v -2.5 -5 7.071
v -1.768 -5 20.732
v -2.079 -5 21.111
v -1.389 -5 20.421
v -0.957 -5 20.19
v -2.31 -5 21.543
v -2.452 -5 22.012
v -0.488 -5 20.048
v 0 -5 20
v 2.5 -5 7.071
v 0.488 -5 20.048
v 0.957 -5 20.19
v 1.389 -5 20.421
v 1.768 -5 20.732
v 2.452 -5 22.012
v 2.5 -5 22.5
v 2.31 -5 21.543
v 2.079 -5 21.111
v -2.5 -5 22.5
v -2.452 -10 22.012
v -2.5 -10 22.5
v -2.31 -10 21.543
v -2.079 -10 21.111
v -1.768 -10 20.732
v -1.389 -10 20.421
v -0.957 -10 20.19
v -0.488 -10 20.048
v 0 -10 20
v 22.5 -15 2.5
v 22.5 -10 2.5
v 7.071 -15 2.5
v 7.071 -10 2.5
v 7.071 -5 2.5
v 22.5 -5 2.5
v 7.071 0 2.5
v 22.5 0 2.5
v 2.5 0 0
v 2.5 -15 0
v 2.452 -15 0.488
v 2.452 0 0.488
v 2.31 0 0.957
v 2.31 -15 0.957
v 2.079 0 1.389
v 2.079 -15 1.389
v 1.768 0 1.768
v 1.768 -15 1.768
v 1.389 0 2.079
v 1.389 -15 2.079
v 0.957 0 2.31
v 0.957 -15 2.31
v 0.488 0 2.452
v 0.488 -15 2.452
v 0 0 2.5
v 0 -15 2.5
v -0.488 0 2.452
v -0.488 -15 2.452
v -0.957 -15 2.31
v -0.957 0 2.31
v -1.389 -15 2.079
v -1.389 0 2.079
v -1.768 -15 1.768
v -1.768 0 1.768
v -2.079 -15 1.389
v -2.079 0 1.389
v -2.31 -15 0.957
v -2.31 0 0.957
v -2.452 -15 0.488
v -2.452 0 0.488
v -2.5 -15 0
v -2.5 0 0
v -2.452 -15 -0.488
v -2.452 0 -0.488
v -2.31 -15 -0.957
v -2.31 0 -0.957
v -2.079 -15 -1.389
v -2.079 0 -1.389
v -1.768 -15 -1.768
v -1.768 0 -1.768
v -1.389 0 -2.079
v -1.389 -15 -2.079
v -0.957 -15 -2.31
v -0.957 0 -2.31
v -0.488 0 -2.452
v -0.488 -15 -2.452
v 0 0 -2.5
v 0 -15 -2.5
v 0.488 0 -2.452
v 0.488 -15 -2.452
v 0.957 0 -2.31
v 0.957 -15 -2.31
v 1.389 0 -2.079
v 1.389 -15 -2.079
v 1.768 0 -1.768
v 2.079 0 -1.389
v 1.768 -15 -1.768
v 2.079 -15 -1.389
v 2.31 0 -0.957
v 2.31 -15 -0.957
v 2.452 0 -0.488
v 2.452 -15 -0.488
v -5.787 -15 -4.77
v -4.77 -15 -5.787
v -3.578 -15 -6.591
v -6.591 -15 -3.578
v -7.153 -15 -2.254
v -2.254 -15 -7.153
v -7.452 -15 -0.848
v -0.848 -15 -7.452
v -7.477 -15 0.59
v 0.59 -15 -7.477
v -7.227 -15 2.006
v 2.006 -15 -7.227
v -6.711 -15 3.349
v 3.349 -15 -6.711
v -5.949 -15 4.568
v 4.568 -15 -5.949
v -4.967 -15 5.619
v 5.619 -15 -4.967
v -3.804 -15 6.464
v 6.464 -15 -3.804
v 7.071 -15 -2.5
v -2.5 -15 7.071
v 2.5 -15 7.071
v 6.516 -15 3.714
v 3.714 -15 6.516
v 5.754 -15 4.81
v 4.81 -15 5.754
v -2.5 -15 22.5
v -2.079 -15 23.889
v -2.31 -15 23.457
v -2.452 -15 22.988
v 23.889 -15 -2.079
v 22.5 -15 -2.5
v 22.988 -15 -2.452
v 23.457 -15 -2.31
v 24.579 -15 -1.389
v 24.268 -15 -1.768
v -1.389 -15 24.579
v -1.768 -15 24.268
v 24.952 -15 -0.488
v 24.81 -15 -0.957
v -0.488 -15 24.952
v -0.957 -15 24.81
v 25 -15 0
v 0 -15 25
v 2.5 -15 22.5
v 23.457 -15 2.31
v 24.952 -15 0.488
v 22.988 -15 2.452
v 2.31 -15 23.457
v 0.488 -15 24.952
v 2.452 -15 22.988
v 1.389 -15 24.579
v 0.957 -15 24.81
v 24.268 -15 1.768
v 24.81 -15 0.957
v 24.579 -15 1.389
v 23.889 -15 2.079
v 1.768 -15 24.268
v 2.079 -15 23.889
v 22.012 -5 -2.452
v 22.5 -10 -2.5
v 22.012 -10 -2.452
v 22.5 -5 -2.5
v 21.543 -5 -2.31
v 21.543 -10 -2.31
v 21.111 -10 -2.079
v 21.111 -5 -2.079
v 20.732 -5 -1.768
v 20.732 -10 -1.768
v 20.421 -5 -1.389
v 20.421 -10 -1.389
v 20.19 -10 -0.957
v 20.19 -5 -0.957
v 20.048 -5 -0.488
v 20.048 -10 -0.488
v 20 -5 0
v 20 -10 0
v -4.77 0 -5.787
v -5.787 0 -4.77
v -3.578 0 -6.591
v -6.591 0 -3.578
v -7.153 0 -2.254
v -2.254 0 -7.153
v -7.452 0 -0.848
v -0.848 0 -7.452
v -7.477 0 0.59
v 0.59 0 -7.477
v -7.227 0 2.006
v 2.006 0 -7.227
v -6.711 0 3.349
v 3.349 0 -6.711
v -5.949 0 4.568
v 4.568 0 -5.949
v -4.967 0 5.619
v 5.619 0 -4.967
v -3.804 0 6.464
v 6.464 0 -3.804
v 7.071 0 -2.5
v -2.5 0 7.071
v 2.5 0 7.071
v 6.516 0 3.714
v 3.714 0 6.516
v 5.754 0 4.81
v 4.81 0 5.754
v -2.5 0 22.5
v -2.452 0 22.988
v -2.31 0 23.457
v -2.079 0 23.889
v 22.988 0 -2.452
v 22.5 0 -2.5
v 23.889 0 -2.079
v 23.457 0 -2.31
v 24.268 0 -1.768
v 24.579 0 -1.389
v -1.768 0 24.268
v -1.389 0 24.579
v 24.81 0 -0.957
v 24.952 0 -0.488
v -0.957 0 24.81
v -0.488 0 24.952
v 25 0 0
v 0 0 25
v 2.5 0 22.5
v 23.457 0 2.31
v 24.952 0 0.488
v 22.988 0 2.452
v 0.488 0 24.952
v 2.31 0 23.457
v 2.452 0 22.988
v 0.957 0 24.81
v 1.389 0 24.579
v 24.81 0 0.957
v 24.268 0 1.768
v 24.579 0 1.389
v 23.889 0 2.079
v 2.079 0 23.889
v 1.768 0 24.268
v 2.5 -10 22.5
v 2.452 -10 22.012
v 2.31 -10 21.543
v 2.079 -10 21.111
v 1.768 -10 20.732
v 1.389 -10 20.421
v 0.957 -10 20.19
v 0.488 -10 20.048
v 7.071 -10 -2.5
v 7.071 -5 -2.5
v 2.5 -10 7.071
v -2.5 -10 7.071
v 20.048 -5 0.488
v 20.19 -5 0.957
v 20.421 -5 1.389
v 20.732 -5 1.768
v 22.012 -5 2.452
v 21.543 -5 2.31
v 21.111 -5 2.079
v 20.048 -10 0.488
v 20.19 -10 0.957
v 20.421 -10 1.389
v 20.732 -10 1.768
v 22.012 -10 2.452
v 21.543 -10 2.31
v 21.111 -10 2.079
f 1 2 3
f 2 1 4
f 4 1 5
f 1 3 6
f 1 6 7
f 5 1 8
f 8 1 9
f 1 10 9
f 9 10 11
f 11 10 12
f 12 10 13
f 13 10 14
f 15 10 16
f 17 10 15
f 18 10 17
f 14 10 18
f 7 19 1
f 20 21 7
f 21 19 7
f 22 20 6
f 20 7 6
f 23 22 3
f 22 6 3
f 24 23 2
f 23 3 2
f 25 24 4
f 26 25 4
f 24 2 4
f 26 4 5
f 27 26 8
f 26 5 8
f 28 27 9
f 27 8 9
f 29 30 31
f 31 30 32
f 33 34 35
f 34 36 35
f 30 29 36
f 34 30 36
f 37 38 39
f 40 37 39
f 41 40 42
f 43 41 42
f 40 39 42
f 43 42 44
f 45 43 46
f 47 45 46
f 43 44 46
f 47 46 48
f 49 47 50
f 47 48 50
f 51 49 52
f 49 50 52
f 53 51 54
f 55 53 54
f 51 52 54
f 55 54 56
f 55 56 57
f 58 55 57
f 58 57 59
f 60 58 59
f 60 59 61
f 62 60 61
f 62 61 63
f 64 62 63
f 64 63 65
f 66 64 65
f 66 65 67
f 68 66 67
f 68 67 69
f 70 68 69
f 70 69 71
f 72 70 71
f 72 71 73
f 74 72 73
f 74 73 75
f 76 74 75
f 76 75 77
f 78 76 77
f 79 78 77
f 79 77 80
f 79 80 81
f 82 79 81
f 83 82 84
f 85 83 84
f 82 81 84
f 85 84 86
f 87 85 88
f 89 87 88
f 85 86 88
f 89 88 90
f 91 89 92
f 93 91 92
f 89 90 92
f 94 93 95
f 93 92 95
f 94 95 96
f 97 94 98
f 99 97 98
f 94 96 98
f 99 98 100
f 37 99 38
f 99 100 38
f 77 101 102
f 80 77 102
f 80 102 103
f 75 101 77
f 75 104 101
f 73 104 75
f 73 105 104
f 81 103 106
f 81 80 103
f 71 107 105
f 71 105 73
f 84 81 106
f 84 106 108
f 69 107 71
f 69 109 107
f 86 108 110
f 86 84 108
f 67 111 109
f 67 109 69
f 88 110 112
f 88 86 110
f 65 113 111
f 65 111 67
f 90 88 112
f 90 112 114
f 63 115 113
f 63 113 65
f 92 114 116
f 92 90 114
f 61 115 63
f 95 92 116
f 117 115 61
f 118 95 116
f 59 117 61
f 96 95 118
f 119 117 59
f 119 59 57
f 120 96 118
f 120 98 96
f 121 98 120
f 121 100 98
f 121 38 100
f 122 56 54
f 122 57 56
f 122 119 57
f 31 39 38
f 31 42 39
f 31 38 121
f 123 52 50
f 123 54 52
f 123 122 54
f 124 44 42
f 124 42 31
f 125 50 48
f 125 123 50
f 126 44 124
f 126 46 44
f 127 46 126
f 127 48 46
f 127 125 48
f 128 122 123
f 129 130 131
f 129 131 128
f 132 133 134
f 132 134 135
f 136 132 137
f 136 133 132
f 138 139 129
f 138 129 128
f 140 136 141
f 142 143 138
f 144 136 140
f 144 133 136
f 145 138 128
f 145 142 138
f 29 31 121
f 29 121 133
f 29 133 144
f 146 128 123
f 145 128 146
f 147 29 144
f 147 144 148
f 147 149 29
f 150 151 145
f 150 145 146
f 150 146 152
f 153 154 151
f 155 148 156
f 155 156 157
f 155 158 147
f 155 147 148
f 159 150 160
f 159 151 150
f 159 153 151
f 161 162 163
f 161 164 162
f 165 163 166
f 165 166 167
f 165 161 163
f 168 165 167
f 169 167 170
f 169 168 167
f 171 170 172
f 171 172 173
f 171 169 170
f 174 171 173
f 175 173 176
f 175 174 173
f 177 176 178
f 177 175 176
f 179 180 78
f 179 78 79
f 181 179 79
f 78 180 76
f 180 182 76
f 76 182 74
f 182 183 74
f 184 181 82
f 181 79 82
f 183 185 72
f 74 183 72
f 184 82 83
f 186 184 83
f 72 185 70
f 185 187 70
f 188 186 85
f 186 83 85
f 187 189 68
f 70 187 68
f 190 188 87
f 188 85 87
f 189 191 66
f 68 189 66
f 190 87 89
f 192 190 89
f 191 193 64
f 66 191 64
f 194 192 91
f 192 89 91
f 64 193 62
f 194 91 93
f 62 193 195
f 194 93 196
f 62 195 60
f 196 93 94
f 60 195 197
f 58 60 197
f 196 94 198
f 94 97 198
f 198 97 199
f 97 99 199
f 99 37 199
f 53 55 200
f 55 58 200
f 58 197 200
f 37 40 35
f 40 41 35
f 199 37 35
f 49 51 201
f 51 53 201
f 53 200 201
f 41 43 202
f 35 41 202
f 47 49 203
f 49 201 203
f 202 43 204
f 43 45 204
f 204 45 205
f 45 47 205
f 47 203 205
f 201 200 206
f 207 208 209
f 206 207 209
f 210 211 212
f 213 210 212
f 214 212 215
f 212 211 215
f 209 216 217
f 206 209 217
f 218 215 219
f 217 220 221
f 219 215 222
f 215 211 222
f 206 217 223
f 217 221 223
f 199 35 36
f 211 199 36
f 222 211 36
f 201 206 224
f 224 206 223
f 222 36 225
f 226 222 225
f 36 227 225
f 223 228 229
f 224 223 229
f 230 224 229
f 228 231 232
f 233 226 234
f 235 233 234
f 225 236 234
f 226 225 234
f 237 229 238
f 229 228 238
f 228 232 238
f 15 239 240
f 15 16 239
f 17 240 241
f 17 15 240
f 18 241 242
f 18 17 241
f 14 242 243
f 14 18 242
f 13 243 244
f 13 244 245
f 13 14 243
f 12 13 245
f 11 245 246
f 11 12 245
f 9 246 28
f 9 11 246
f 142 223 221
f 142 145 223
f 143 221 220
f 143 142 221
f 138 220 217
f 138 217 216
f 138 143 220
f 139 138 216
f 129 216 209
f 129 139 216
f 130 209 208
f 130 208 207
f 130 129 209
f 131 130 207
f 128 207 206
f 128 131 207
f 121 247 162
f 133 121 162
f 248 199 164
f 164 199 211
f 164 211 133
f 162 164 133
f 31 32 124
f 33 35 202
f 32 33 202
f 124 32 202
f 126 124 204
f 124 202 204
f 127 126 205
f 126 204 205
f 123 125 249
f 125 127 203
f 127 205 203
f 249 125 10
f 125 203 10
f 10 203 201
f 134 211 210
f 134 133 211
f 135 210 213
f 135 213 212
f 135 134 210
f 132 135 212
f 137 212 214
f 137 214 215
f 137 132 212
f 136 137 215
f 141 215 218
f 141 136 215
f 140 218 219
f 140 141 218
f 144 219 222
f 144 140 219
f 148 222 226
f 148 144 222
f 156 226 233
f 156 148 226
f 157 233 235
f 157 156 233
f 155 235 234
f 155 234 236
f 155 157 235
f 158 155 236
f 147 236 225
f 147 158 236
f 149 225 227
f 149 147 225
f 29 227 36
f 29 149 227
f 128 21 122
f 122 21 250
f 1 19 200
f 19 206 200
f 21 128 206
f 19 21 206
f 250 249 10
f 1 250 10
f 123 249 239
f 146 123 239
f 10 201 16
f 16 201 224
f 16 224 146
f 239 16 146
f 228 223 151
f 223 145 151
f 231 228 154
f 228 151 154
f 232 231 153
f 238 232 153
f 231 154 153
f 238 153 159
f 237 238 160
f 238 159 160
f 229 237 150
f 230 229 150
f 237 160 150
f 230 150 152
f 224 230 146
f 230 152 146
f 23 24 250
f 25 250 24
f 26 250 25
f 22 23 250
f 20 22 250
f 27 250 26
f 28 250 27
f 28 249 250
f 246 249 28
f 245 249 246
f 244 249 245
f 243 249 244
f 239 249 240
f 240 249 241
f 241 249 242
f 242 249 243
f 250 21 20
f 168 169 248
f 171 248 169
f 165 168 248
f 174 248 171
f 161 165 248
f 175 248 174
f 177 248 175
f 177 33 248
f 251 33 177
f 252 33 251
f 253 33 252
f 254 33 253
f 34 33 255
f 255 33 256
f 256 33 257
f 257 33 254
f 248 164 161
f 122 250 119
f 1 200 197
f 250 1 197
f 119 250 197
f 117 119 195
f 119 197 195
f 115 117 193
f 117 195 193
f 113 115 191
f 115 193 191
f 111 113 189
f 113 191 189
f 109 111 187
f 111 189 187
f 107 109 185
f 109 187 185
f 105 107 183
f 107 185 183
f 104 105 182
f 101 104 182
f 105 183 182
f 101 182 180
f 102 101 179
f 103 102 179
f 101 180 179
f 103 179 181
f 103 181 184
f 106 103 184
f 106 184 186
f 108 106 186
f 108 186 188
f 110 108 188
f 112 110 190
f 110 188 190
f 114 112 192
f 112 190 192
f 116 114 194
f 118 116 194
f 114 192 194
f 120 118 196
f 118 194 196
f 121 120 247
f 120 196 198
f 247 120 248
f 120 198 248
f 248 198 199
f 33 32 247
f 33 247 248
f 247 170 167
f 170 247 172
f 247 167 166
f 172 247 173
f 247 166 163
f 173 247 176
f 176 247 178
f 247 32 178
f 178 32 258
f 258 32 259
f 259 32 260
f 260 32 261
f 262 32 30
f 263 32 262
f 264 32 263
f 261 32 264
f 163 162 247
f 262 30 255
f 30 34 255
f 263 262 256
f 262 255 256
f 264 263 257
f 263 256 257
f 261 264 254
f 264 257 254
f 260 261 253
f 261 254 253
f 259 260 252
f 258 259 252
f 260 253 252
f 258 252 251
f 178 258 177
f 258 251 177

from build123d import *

# Parameters (mm, degrees)
F1_DEPTH = 15
F2_W     = 5
F2_H     = 12.9289321881
F3_DEPTH = 25
F4_W     = 12.9289321881
F4_H     = 5
F5_DEPTH = 25
F6_R     = 2.49999
F7_R     = 2.5
F8_DEPTH = 25


# Not quite as in the source:
# - a fillet or chamfer is up to 0.001 mm smaller than in the source, because OpenCascade refuses the exact size


with BuildPart() as f1:
    # F0 (on Front) → F1 (new body)
    with BuildSketch(Plane.XZ):
        with BuildLine():
            Line((2.5, 25), (-2.5, 25))
            Line((-2.5, 25), (-2.5, 7.0710678119))
            ThreePointArc((-2.5, 7.0710678119), (-5.3033008589, -5.3033008589), (7.0710678119, -2.5))
            Line((7.0710678119, -2.5), (25, -2.5))
            Line((25, -2.5), (25, 2.5))
            Line((25, 2.5), (7.0710678119, 2.5))
            ThreePointArc((7.0710678119, 2.5), (5.3033008589, 5.3033008589), (2.5, 7.0710678119))
            Line((2.5, 7.0710678119), (2.5, 25))
        make_face()
    extrude(amount=F1_DEPTH)

    # F2 (on face) → F3 (cut)
    with BuildSketch(Plane.YZ.offset(2.5)):
        with Locations((-7.5, 13.5355339059)):
            Rectangle(F2_W, F2_H)
    extrude(amount=-F3_DEPTH, mode=Mode.SUBTRACT)

    # F4 (on face) → F5 (cut)
    with BuildSketch(Plane.XY.offset(2.5)):
        with Locations((13.5355339059, -7.5)):
            Rectangle(F4_W, F4_H)
    extrude(amount=-F5_DEPTH, mode=Mode.SUBTRACT)

    # F6 (radius 2.5 in the source; OpenCascade refuses exactly that, so slightly less here)
    f6_edges = [f1.edges().sort_by_distance(p)[0] for p in [
        (-2.5, -7.5, 25),
        (2.5, -7.5, 25),
        (-2.5, -7.5, 20),
        (2.5, -7.5, 20),
        (25, -7.5, -2.5),
        (25, -7.5, 2.5),
        (20, -7.5, -2.5),
        (20, -7.5, 2.5),
    ]]
    fillet(f6_edges, radius=F6_R)

    # F7 (on face) → F8 (cut)
    with BuildSketch(Plane.XZ.offset(15)):
        Circle(F7_R)
    extrude(amount=-F8_DEPTH, mode=Mode.SUBTRACT)


solid = f1.part
